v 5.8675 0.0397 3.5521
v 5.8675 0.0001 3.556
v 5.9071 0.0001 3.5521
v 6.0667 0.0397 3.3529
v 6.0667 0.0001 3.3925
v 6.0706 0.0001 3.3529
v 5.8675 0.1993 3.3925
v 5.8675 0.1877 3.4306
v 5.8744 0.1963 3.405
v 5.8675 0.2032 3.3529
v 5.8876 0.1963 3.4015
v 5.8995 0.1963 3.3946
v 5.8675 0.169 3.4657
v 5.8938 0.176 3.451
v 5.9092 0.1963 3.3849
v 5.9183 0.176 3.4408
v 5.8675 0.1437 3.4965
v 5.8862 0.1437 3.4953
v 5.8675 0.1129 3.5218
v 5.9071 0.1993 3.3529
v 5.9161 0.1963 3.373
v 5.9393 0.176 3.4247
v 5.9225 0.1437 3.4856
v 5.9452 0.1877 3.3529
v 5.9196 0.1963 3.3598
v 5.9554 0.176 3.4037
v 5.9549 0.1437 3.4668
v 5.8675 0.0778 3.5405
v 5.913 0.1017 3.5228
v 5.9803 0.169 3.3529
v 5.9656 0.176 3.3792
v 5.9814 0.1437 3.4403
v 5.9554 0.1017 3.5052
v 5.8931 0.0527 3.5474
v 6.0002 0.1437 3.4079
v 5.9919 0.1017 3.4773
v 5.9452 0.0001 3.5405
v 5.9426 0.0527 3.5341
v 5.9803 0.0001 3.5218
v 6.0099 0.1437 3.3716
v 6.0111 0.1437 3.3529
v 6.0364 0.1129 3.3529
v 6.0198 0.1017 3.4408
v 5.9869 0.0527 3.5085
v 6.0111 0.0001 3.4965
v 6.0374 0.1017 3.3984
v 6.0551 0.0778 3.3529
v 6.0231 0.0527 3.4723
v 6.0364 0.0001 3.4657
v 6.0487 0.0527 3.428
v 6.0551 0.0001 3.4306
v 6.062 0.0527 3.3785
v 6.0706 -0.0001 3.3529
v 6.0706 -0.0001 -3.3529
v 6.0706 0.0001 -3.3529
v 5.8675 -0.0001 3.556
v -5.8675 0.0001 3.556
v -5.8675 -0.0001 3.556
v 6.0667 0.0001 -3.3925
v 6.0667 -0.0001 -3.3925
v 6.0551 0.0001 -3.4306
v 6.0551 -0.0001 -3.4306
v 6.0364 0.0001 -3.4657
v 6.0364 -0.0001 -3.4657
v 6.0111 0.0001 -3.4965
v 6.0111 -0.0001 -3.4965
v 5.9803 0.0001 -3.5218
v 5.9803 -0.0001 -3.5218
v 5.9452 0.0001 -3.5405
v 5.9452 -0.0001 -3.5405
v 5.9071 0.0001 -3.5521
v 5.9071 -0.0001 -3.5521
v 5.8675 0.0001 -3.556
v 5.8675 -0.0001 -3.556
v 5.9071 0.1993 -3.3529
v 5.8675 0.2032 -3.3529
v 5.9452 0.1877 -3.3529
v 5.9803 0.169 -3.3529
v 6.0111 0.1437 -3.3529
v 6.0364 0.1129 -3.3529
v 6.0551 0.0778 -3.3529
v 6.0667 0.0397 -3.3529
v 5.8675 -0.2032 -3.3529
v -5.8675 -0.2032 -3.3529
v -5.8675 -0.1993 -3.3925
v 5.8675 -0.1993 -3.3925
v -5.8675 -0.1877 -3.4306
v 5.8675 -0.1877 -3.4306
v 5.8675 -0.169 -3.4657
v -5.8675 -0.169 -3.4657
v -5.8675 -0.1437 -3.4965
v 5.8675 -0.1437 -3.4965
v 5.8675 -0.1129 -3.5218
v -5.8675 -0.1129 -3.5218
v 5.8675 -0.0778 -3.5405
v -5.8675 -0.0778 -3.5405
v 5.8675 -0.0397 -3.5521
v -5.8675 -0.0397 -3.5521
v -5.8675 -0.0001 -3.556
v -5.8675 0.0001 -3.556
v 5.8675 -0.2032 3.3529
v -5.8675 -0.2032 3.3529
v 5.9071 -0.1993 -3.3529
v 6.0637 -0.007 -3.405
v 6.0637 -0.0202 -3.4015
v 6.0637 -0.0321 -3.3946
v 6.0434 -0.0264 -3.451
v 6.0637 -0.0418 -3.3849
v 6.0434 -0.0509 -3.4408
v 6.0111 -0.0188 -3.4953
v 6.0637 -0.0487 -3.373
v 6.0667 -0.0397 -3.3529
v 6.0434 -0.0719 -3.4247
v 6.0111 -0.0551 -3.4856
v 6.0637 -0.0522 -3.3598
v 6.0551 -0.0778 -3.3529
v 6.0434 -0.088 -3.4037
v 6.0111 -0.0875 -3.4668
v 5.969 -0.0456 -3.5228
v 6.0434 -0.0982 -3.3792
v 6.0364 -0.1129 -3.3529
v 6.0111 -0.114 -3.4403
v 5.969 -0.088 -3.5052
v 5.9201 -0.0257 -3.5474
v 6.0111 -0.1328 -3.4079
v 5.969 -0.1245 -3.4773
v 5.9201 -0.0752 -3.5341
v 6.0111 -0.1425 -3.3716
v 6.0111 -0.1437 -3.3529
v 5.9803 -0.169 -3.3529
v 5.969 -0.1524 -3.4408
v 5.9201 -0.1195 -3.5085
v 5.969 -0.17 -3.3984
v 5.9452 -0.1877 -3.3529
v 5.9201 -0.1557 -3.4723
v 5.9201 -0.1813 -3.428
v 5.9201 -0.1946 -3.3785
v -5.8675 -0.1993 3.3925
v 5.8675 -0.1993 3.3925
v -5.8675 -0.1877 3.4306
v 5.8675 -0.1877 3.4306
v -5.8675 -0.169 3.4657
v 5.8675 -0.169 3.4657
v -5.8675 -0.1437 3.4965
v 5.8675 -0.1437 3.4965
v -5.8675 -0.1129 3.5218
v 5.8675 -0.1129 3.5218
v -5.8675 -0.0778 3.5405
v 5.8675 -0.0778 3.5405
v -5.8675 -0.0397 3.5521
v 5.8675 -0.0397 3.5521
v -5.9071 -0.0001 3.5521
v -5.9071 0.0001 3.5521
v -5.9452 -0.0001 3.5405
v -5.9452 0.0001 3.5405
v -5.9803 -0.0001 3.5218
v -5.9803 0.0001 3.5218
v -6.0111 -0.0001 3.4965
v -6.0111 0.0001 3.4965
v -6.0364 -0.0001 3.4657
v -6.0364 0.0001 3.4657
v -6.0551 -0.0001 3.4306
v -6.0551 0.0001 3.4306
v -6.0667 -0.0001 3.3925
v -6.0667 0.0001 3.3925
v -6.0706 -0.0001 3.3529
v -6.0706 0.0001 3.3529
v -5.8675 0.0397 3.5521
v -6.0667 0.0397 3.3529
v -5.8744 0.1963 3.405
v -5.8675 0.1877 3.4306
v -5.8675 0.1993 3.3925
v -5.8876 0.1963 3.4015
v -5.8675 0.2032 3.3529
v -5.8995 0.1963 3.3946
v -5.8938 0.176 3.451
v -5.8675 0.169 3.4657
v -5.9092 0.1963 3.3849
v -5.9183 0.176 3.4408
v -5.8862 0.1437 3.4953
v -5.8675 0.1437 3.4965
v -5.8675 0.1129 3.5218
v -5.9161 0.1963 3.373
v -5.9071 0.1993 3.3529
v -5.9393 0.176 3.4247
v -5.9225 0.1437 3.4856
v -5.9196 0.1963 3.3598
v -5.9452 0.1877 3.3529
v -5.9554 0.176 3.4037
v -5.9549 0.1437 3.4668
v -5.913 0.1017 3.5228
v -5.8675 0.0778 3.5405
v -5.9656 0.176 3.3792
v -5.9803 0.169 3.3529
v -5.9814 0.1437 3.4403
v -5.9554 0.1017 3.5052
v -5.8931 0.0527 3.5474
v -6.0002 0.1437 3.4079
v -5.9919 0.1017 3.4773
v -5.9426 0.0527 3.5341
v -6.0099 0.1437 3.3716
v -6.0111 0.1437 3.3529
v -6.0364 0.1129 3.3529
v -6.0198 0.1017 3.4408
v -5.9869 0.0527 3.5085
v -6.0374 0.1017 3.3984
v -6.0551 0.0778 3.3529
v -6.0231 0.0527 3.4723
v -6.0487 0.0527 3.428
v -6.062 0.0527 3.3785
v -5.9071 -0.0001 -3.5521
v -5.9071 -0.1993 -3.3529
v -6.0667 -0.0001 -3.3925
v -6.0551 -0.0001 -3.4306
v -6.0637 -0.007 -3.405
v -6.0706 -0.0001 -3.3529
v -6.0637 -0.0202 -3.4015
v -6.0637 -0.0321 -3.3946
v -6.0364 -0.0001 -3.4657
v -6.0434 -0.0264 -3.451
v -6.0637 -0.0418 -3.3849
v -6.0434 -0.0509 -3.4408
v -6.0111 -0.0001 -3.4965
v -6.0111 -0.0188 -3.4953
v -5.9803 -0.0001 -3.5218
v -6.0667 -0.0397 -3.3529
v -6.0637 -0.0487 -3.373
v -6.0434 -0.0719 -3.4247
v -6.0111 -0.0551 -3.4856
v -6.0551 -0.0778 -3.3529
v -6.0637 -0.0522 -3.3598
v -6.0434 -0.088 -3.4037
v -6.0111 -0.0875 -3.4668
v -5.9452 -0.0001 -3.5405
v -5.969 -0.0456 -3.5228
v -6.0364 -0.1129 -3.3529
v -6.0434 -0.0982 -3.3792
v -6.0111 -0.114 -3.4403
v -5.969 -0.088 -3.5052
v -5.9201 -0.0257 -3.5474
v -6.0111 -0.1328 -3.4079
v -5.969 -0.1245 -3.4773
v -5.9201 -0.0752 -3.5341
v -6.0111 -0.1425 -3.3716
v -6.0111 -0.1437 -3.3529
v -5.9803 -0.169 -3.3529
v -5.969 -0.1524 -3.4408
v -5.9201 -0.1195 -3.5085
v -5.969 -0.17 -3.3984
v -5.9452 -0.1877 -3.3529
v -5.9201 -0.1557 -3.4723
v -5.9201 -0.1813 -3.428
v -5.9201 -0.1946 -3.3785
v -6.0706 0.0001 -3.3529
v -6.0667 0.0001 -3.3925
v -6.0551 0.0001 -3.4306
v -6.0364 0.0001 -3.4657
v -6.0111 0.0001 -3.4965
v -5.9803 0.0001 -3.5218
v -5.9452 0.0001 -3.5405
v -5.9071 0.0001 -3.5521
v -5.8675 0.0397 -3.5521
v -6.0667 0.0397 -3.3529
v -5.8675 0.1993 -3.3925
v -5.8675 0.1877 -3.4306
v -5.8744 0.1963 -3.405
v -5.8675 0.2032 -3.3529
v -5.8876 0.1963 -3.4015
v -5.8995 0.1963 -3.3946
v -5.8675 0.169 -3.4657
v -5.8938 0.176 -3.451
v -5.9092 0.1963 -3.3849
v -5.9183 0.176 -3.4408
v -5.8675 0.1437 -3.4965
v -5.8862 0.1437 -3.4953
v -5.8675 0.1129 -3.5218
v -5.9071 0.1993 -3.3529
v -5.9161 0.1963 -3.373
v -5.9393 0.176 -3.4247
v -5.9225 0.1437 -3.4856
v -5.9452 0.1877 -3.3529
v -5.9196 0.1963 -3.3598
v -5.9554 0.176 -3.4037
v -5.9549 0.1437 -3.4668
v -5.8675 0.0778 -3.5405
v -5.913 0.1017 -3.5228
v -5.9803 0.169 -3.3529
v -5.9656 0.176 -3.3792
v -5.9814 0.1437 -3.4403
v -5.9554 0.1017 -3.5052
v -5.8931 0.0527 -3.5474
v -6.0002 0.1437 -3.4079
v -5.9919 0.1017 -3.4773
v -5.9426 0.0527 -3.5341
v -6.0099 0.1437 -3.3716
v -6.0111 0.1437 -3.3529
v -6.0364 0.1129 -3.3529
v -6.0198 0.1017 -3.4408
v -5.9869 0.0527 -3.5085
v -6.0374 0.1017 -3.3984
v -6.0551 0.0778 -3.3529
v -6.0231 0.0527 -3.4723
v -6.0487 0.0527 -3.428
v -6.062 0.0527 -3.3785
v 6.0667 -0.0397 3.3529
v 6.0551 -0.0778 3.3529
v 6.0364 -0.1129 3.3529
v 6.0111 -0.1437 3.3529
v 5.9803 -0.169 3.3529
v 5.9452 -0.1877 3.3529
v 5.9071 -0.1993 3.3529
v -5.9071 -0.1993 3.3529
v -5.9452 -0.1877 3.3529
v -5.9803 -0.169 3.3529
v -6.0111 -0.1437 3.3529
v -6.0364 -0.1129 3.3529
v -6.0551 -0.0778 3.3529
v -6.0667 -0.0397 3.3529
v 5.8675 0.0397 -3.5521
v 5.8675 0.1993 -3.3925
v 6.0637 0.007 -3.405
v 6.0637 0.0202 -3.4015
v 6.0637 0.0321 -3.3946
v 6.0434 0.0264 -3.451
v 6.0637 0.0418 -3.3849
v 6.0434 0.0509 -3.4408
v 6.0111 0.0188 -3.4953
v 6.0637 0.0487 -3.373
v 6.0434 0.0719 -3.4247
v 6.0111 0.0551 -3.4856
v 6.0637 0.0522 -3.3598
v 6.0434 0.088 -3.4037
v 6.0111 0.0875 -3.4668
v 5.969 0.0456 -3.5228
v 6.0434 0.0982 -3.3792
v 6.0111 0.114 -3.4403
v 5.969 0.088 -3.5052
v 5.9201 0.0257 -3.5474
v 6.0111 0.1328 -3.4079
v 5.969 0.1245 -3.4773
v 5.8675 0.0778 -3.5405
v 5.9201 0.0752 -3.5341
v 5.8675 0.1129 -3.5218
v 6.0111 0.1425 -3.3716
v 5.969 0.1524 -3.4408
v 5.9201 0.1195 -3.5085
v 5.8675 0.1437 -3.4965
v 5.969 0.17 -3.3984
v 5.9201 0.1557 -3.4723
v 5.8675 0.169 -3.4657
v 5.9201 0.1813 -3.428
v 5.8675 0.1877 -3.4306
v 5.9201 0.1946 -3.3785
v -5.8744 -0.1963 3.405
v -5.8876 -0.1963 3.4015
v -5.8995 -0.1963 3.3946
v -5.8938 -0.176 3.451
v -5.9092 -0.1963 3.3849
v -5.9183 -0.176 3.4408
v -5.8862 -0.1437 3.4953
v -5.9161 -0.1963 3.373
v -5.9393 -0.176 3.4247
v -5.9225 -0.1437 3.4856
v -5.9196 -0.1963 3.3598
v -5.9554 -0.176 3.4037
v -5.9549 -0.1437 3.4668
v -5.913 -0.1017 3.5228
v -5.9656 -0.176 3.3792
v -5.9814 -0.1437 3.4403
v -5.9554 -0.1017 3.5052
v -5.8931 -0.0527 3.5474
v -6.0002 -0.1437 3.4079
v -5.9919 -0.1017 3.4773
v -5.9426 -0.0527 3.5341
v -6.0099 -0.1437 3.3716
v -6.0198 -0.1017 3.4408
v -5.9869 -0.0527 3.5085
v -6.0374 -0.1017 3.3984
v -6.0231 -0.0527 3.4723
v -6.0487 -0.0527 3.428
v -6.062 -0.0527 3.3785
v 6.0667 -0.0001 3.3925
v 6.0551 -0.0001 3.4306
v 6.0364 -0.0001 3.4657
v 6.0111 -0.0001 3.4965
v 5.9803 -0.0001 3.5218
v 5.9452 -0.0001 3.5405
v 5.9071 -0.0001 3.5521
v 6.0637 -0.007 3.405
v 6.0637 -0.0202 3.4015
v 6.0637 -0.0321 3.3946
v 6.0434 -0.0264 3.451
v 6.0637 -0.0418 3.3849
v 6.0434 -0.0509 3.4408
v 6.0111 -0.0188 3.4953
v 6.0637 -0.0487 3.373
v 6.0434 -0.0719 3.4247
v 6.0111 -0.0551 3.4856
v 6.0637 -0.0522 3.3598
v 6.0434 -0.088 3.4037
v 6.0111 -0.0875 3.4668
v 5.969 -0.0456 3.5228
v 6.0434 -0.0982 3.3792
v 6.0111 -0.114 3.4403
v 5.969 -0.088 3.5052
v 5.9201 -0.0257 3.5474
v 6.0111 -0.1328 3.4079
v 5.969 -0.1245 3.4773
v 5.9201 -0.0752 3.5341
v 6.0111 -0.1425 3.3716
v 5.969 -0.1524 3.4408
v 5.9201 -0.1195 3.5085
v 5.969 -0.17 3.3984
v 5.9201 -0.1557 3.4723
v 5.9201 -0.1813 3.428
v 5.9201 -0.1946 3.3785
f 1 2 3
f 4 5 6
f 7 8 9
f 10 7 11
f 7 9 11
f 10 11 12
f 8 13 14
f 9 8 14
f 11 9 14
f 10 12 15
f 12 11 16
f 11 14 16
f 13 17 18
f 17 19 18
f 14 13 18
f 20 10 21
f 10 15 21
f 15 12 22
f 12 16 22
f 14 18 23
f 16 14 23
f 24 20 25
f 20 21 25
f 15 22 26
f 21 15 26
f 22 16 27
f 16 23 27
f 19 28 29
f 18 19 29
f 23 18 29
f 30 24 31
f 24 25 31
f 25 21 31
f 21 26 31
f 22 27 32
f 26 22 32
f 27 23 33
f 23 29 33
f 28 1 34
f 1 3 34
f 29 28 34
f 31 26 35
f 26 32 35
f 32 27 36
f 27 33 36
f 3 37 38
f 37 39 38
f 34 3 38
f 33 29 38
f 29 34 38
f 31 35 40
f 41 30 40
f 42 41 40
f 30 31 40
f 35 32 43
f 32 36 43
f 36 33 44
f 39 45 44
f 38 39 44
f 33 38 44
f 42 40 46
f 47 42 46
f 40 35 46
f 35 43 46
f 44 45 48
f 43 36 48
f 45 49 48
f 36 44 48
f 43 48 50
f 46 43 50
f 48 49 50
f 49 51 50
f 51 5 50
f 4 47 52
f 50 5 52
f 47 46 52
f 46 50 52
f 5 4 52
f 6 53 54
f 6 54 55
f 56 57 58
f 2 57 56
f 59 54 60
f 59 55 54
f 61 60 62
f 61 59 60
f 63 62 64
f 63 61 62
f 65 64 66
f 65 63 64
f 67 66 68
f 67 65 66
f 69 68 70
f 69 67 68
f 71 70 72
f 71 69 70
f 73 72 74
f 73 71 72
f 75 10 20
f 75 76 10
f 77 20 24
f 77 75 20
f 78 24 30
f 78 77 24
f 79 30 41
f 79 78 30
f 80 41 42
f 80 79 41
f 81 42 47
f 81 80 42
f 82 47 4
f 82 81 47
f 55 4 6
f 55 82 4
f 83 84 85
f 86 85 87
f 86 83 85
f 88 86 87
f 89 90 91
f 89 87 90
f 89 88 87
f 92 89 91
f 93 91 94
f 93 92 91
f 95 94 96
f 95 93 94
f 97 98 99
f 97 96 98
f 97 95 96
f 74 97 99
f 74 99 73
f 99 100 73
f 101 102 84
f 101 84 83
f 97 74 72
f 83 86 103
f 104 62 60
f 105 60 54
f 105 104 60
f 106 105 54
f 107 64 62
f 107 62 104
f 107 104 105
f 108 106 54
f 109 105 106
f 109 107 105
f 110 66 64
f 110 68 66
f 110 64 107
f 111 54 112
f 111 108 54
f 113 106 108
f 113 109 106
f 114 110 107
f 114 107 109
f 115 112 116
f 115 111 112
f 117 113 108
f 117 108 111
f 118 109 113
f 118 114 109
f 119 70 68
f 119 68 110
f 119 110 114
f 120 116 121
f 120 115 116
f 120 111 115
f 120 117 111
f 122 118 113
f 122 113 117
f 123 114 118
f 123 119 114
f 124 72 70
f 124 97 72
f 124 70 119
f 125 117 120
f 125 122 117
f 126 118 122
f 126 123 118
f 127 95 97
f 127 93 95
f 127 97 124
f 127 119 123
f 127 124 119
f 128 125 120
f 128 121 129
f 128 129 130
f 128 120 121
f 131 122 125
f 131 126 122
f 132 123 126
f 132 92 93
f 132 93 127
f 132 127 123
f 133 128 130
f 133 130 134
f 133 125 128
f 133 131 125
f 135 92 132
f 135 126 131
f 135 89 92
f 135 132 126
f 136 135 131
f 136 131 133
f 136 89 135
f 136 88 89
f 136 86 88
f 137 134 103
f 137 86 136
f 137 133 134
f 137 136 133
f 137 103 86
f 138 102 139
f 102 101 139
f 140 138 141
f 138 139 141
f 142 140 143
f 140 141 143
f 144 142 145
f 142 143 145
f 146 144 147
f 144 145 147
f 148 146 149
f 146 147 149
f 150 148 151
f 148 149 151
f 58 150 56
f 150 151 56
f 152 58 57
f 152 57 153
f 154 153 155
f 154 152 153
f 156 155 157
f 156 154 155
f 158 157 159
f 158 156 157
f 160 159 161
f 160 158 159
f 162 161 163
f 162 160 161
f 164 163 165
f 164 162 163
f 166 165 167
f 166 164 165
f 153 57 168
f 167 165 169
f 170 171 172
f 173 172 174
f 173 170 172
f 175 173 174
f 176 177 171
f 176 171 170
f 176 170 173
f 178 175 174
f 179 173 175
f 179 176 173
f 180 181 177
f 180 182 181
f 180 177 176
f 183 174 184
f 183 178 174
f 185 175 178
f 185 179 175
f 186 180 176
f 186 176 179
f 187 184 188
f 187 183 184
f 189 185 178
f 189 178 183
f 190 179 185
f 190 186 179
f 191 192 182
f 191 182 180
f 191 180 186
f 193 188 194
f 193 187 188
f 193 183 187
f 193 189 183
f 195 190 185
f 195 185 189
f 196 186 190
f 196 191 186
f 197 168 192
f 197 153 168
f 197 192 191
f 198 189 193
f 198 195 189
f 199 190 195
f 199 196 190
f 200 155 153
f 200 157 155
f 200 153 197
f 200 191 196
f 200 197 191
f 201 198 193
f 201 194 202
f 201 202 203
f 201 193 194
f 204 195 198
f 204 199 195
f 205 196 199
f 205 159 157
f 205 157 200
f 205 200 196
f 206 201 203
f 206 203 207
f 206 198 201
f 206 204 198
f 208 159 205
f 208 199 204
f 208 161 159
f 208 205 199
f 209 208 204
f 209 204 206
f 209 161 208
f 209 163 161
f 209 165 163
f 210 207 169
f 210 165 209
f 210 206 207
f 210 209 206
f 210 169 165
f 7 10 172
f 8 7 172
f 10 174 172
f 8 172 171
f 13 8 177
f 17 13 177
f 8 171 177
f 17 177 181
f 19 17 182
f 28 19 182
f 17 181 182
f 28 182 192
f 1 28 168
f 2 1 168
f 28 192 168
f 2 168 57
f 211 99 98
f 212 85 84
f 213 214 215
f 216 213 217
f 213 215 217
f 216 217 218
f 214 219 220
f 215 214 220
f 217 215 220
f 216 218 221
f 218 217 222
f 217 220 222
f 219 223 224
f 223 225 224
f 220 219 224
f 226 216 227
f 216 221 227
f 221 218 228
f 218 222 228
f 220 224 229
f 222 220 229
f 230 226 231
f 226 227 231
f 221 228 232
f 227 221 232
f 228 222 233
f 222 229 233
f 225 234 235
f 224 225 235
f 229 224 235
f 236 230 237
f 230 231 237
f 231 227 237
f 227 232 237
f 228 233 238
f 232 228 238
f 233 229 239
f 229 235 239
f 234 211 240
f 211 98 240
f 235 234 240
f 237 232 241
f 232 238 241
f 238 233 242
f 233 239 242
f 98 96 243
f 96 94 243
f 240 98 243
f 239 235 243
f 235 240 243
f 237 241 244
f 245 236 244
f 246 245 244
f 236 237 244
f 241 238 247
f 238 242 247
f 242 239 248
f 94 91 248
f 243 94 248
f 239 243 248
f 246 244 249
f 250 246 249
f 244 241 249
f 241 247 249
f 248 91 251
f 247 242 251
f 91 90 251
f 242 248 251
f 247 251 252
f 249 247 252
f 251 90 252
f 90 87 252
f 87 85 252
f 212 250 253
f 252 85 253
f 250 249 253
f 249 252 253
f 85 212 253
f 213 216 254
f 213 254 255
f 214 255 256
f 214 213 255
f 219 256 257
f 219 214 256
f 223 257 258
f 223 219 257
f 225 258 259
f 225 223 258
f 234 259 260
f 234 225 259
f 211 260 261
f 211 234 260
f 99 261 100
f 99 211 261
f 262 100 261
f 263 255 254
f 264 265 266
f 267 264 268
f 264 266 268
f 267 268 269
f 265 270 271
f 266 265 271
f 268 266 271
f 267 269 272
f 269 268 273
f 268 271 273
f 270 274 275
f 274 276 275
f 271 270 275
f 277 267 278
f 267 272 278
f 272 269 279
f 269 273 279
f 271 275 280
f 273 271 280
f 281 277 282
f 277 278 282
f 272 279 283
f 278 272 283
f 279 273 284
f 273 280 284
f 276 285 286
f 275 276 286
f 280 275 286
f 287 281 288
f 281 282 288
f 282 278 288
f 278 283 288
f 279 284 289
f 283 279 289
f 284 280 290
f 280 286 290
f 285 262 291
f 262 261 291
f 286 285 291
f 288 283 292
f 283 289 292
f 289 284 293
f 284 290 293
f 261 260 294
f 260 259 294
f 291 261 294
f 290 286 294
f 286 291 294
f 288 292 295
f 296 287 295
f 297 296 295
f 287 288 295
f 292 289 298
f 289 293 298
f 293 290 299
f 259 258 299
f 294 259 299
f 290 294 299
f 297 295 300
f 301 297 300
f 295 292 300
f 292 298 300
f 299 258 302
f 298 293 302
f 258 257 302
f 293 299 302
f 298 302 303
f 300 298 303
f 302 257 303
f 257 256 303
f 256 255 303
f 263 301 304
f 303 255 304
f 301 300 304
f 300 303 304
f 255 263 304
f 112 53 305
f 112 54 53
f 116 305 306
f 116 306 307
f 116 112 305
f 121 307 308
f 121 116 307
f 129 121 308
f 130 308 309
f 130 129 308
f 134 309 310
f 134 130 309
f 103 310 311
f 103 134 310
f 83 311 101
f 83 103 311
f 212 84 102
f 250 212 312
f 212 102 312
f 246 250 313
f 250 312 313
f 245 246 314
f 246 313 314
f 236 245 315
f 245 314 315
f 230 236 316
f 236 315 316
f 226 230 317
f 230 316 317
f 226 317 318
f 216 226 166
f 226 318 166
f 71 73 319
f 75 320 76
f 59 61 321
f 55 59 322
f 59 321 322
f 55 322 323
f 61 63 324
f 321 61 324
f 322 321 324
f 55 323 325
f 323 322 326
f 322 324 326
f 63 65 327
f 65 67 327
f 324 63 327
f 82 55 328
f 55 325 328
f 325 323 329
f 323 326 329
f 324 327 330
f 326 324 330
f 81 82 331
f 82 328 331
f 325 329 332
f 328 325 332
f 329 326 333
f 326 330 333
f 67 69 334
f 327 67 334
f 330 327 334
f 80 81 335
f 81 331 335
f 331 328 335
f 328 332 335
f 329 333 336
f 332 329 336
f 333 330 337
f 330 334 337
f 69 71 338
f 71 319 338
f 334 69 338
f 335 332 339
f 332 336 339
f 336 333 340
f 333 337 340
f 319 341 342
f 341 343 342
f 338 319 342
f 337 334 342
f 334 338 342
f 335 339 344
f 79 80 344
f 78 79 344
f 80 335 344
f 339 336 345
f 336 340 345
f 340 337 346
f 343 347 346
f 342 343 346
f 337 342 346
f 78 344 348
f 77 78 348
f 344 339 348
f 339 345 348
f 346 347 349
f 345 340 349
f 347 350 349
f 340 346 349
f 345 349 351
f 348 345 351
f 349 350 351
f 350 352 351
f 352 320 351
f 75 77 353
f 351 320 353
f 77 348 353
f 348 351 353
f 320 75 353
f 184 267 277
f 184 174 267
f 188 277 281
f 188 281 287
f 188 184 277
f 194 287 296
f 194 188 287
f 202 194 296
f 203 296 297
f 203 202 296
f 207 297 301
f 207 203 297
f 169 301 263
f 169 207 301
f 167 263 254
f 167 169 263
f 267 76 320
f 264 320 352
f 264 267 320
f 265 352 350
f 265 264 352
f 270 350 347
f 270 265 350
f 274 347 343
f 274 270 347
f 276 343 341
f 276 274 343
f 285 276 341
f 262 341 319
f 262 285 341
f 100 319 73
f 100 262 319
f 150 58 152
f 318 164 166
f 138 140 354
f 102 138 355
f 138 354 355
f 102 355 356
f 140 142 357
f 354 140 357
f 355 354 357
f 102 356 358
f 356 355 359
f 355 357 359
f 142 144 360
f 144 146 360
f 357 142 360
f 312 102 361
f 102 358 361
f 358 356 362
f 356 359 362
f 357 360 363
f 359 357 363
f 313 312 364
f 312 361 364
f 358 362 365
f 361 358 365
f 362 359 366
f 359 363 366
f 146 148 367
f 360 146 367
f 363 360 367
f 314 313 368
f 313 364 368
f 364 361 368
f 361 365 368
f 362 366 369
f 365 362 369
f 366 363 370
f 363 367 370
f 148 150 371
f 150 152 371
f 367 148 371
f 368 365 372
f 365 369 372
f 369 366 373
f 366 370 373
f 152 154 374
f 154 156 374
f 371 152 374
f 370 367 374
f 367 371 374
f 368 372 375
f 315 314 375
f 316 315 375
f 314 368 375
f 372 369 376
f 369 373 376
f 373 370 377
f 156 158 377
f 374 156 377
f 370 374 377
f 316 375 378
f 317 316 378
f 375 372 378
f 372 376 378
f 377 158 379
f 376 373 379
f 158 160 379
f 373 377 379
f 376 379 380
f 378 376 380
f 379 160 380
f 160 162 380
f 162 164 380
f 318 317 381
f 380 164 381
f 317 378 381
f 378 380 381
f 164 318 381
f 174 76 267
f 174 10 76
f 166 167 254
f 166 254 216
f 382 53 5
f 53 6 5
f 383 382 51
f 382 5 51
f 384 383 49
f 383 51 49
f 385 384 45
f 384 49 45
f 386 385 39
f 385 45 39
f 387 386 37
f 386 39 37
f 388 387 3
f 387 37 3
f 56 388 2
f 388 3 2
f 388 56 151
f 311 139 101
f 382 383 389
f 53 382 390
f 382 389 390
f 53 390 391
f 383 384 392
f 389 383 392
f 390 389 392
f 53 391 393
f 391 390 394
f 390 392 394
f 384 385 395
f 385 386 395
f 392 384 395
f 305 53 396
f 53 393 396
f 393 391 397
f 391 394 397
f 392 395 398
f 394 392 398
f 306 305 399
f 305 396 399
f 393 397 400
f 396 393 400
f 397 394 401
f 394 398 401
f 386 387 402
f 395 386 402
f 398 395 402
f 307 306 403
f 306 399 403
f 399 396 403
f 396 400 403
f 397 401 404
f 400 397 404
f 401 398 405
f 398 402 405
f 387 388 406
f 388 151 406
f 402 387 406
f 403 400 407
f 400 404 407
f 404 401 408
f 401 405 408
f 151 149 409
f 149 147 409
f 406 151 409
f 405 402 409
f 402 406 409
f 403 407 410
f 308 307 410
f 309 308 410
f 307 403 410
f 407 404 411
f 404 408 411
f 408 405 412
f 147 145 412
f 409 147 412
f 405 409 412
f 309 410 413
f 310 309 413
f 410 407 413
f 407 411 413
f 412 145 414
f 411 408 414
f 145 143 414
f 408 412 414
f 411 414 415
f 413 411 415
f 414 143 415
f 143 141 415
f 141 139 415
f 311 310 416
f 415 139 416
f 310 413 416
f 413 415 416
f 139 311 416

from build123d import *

# Parameters (mm, degrees)
BOSS_EXTRUDE1_DEPTH = 3.556
FILLET3_R           = 0.2032


with BuildPart() as part:
    # Sketch1 → Boss-Extrude1 (new, symmetric)
    with BuildSketch(Plane.XY):
        Polygon((6.0706, 0.2032), (-6.0706, 0.2032), (-6.0706, -0.2032), (5.6642, -0.2032), (6.0706, -0.2032), align=None)
    extrude(amount=BOSS_EXTRUDE1_DEPTH, both=True)

    # Fillet3
    fillet3_edges = [part.edges().sort_by_distance(p)[0] for p in [
        (-6.0706, 0, 3.556),
        (0, -0.2032, 3.556),
        (6.0706, 0, 3.556),
        (0, -0.2032, -3.556),
        (-6.0706, 0, -3.556),
        (0, 0.2032, -3.556),
        (6.0706, 0, -3.556),
        (6.0706, -0.2032, 0),
        (-6.0706, -0.2032, 0),
        (0, 0.2032, 3.556),
        (-6.0706, 0.2032, 0),
        (6.0706, 0.2032, 0),
    ]]
    fillet(fillet3_edges, radius=FILLET3_R - 0.0001)  # a hair under: the kernel refuses the full size


solid = part.part
